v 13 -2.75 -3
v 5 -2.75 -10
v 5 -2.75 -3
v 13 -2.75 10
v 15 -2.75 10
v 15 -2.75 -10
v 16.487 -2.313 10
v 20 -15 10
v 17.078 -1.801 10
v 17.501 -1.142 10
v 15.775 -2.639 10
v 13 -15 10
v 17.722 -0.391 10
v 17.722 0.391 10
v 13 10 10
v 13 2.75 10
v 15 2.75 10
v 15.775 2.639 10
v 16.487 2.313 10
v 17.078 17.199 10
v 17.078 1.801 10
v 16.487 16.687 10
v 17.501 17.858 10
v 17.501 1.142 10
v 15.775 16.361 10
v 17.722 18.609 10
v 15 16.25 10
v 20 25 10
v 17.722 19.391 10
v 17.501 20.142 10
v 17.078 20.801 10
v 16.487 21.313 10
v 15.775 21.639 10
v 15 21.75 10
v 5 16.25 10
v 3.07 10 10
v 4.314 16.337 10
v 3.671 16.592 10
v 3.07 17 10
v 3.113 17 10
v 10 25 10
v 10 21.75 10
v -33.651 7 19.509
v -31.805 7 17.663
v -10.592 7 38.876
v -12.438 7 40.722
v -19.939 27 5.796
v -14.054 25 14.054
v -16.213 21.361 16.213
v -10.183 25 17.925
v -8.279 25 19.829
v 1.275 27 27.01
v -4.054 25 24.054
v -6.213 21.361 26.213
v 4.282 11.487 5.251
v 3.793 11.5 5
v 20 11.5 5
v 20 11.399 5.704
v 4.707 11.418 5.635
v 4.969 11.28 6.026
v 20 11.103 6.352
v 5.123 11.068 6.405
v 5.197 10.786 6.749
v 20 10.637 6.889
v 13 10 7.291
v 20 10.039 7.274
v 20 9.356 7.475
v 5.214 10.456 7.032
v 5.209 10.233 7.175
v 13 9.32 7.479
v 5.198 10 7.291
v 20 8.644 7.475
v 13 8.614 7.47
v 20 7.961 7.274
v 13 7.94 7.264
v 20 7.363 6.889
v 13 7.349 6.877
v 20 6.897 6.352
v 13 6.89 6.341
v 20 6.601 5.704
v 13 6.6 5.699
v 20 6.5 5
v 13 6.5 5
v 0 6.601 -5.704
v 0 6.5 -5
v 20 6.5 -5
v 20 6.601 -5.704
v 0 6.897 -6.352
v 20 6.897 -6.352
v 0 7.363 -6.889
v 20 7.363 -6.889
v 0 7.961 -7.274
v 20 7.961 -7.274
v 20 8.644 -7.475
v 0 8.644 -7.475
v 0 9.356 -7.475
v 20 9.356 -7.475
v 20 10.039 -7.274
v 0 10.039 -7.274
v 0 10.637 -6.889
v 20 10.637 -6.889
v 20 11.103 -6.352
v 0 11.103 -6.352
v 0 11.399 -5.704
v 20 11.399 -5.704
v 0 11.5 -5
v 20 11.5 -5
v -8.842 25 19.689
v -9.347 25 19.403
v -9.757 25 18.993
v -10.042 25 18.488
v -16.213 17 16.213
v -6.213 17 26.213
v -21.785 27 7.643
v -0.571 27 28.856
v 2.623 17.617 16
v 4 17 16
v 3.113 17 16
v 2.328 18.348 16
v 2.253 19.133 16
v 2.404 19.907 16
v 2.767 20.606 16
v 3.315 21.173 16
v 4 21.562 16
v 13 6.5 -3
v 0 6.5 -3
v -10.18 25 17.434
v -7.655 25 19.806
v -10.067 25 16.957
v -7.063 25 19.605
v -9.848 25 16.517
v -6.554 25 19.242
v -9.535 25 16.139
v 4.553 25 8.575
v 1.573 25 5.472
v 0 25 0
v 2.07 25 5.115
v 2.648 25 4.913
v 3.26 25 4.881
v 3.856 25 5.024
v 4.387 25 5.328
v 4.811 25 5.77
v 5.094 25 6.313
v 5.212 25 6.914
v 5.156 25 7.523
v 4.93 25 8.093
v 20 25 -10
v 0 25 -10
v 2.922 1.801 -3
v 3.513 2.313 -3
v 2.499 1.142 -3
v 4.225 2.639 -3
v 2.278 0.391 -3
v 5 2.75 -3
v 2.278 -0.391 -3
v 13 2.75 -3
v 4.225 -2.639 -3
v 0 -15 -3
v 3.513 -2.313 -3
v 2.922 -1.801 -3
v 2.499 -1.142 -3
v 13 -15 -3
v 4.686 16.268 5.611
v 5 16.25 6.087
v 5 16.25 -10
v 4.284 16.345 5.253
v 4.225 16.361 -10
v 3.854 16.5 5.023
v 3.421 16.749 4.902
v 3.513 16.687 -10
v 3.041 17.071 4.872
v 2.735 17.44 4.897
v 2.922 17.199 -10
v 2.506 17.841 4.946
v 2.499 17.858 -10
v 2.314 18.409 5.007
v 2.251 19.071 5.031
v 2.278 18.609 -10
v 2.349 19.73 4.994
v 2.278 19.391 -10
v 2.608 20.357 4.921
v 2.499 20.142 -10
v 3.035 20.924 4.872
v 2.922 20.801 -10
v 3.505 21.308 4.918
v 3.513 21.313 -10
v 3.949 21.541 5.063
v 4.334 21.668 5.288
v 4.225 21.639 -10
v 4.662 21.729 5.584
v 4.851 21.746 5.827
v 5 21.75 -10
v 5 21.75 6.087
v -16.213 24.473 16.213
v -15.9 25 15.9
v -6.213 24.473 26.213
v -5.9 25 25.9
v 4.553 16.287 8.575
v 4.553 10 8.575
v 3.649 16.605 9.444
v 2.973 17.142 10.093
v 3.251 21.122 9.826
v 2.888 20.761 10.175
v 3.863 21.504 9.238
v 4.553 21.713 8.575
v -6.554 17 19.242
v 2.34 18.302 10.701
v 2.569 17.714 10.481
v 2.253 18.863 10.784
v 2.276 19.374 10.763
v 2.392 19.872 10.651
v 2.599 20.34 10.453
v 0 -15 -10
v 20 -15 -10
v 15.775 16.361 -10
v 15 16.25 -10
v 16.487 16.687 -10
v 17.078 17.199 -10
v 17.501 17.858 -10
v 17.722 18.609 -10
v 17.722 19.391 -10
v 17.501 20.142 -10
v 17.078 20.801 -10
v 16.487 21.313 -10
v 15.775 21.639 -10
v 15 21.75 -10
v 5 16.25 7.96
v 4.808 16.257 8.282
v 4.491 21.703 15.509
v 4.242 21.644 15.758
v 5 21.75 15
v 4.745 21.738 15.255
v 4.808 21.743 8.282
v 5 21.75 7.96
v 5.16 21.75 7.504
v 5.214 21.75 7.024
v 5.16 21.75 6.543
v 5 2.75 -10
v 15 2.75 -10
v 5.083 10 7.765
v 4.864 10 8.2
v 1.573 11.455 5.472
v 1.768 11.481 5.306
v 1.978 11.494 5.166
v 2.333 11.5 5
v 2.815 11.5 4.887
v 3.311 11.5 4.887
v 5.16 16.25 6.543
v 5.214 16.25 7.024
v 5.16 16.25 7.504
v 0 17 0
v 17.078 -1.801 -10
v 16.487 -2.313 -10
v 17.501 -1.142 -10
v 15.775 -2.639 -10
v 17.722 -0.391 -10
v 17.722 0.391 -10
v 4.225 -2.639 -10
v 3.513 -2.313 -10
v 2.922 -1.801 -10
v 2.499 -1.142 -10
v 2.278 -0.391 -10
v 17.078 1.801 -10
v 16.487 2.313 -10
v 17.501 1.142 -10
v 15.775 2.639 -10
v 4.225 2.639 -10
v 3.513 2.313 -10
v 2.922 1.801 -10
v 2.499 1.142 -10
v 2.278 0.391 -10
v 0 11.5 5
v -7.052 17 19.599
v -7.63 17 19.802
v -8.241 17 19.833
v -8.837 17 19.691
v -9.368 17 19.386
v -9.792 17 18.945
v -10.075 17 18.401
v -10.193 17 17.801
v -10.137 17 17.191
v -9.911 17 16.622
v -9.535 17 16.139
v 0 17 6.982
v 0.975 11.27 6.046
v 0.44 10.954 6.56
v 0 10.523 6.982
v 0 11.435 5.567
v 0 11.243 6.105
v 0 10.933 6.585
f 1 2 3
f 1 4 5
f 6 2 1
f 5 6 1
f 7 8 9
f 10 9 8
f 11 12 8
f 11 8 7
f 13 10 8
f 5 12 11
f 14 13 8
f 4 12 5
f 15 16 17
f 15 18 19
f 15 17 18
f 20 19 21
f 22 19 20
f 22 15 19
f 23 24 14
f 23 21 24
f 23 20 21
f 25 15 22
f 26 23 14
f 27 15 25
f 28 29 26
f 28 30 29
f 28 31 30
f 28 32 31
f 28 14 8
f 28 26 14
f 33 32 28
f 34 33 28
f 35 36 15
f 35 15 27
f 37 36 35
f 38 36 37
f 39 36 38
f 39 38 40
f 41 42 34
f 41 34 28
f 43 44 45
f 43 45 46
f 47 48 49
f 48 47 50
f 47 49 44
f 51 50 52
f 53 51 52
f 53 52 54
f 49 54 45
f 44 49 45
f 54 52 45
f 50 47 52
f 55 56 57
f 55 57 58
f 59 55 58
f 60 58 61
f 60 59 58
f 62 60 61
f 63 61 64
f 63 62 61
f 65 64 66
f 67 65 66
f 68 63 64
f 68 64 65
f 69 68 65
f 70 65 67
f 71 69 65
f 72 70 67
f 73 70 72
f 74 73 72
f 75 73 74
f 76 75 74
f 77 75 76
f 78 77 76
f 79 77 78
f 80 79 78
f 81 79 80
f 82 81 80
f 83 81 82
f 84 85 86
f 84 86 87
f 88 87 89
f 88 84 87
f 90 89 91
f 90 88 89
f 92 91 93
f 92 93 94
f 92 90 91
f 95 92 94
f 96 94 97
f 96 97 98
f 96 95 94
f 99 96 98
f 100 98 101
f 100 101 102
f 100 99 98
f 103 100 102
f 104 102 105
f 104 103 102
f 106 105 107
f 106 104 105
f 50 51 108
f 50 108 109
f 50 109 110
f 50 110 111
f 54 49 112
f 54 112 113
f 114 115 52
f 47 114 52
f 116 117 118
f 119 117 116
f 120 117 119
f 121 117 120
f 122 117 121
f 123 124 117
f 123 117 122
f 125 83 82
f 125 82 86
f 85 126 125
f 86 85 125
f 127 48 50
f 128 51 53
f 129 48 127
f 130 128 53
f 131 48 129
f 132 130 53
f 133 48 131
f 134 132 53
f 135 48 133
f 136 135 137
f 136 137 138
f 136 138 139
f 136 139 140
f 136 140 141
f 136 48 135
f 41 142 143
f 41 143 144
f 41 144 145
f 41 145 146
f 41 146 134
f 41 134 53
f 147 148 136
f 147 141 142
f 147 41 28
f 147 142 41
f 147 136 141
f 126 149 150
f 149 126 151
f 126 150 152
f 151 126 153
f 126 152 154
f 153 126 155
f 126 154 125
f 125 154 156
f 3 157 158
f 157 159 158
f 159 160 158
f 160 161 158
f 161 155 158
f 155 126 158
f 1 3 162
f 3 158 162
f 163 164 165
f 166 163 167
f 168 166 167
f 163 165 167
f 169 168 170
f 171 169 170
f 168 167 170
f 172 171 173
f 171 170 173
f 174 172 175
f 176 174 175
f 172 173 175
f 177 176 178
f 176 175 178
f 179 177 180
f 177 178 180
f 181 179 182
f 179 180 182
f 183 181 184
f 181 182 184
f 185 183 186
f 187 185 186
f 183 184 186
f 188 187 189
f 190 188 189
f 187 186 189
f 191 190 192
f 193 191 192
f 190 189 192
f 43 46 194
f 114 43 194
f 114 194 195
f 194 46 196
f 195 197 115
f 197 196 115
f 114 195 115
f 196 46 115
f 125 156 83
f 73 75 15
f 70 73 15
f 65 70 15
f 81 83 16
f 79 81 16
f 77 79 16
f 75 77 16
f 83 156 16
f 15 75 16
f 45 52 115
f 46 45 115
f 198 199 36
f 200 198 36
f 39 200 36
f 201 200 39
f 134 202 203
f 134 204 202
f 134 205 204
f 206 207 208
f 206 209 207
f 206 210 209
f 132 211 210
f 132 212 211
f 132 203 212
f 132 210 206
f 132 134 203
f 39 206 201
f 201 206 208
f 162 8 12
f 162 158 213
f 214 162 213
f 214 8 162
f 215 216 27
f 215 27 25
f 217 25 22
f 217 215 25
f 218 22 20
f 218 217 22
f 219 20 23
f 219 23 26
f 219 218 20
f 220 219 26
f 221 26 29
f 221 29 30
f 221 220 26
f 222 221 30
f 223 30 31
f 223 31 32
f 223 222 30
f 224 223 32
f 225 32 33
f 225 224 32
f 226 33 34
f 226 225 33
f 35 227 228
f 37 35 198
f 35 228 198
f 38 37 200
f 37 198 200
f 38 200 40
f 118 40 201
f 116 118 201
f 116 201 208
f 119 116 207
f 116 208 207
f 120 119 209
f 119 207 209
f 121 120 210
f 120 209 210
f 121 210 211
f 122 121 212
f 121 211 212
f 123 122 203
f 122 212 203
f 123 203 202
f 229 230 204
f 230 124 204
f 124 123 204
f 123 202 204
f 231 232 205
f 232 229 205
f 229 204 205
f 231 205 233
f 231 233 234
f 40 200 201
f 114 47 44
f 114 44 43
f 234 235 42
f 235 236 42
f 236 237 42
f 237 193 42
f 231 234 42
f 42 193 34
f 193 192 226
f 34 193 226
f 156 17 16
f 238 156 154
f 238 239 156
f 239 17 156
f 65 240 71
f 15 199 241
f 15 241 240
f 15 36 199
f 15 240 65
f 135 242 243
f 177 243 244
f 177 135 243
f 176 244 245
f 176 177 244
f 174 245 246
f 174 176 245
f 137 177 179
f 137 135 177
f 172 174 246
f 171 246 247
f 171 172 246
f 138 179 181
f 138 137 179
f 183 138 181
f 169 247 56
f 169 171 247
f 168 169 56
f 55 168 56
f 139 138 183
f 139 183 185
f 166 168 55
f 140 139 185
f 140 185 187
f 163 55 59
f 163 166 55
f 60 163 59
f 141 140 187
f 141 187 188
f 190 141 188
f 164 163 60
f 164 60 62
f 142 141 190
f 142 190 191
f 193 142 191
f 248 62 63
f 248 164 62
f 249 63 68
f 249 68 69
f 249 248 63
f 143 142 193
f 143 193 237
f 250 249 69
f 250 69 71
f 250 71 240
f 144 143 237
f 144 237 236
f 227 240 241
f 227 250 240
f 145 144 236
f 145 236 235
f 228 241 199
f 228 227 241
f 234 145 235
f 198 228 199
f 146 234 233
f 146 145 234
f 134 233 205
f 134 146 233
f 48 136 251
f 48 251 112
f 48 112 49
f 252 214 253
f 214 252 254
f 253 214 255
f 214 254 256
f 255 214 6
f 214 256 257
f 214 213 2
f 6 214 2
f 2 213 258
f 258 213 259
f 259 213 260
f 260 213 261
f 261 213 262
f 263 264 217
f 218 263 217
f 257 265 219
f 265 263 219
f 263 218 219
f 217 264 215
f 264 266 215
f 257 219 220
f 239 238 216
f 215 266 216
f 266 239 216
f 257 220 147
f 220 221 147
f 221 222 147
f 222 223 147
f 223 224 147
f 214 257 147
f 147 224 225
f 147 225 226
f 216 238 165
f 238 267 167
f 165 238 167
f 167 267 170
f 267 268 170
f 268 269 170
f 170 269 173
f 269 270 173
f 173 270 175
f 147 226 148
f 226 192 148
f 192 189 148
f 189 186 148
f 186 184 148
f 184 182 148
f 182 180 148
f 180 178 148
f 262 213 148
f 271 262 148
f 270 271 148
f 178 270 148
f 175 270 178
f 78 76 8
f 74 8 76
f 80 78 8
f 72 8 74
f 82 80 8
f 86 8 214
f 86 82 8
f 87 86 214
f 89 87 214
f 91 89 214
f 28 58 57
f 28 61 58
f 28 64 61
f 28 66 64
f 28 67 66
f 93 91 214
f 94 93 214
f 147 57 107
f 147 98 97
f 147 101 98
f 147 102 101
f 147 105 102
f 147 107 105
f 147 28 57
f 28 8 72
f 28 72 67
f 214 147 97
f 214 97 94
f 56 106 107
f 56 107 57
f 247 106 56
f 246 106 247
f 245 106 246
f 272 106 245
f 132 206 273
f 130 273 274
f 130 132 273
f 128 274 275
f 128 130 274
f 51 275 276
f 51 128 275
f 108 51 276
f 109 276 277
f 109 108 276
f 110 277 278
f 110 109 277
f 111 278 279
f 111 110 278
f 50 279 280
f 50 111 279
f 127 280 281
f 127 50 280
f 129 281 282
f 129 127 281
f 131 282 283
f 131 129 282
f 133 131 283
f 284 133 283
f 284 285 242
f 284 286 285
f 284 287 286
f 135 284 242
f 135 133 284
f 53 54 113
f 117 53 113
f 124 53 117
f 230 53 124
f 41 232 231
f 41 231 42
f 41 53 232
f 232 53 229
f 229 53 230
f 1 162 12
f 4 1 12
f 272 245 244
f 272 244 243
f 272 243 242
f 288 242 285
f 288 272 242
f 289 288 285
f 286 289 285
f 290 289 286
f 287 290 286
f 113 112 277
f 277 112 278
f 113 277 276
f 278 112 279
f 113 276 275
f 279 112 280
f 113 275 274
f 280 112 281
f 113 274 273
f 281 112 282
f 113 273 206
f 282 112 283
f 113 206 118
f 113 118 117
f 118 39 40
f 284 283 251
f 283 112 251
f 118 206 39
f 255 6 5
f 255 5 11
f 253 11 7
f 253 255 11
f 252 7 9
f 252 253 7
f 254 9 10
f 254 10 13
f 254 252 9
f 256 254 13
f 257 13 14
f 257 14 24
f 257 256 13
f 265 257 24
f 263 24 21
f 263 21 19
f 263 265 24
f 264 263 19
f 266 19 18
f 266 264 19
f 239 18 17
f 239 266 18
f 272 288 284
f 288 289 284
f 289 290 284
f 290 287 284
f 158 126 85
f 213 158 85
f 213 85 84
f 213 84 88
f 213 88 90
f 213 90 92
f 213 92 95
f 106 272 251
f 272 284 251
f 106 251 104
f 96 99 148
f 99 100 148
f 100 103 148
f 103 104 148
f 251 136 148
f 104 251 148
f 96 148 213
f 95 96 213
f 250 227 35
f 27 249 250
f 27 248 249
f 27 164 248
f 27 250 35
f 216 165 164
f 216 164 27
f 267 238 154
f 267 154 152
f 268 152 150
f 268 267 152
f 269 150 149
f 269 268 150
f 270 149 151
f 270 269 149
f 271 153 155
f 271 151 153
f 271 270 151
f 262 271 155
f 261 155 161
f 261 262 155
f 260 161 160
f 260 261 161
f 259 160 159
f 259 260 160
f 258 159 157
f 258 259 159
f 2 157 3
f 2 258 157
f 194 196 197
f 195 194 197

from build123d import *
from build123d.topology import SkipClean

# Parameters (mm, degrees)
SKETCH_1_W           = 20
SKETCH_1_H           = 50
EXTRUDE_2_DEPTH      = 20
SKETCH_2_W           = 20
SKETCH_2_H           = 10
CUT_EXTRUDE_1_DEPTH  = 20
CUT_EXTRUDE_2_DEPTH  = 20
CUT_EXTRUDE_3_DEPTH  = 20
CUT_EXTRUDE_4_DEPTH  = 20
SKETCH_6_W           = 13
SKETCH_6_H           = 13
CUT_EXTRUDE_5_DEPTH  = 25
EXTRUDE_3_DEPTH      = 8
EXTRUDE_6_DEPTH      = 10
EXTRUDE_6_DEPTH_BACK = 20
CUT_EXTRUDE_7_DEPTH  = 18
CUT_EXTRUDE_8_DEPTH  = 26
CUT_EXTRUDE_9_DEPTH  = 26


with BuildPart() as part:
    # 草图1 → 凸台-拉伸2 (new body)
    with BuildSketch(Plane(origin=(0, 0, 0), x_dir=(0, 0, -1), z_dir=(1, 0, 0))):
        Rectangle(SKETCH_1_W, SKETCH_1_H)
    extrude(amount=EXTRUDE_2_DEPTH)

    # 草图2 → 切除-拉伸1 (cut)
    with BuildSketch(Plane(origin=(20, 0, 0), x_dir=(0, 0, -1), z_dir=(1, 0, 0))):
        with Locations((0, -20)):
            Rectangle(SKETCH_2_W, SKETCH_2_H)
    extrude(amount=-CUT_EXTRUDE_1_DEPTH, mode=Mode.SUBTRACT)

    # 草图3 → 切除-拉伸2 (cut)
    with BuildSketch(Plane(origin=(0, 0, -10), x_dir=(-1, 0, 0), z_dir=(0, 0, -1))):
        with BuildLine():
            Line((-15, 21.75), (-5, 21.75))
            ThreePointArc((-5, 21.75), (-2.25, 19), (-5, 16.25))
            Line((-5, 16.25), (-15, 16.25))
            ThreePointArc((-15, 16.25), (-17.75, 19), (-15, 21.75))
        make_face()
    extrude(amount=-CUT_EXTRUDE_2_DEPTH, mode=Mode.SUBTRACT)

    # 草图4 → 切除-拉伸3 (cut)
    with BuildSketch(Plane.ZY):
        with BuildLine():
            Line((-5, 11.5), (5, 11.5))
            ThreePointArc((5, 11.5), (7.5, 9), (5, 6.5))
            Line((5, 6.5), (-5, 6.5))
            ThreePointArc((-5, 6.5), (-7.5, 9), (-5, 11.5))
        make_face()
    extrude(amount=-CUT_EXTRUDE_3_DEPTH, mode=Mode.SUBTRACT)

    # 草图5 → 切除-拉伸4 (cut)
    with BuildSketch(Plane(origin=(0, 0, -10), x_dir=(-1, 0, 0), z_dir=(0, 0, -1))):
        with BuildLine():
            Line((-15, 2.75), (-5, 2.75))
            ThreePointArc((-5, 2.75), (-2.25, 0), (-5, -2.75))
            Line((-5, -2.75), (-15, -2.75))
            ThreePointArc((-15, -2.75), (-17.75, 0), (-15, 2.75))
        make_face()
    extrude(amount=-CUT_EXTRUDE_4_DEPTH, mode=Mode.SUBTRACT)

    # 草图6 → 切除-拉伸5 (cut)
    with BuildSketch(Plane.XZ.offset(15)):
        with Locations((6.5, 3.5)):
            Rectangle(SKETCH_6_W, SKETCH_6_H)
    extrude(amount=-CUT_EXTRUDE_5_DEPTH, mode=Mode.SUBTRACT)

    # 草图7 → 凸台-拉伸3 (add)
    with BuildSketch(Plane(origin=(0, 25, 0), x_dir=(1, 0, 0), z_dir=(0, 1, 0))):
        Polygon((-16.213203436, -16.213203436), (-6.213203436, -26.213203436), (10, -10), (0, 0), align=None)
    extrude(amount=-EXTRUDE_3_DEPTH)

    # 草图8 → 凸台-拉伸6 (add, two sides: drawn at the far end of the back side and taken through both)
    with BuildSketch(Plane(origin=(0, 0, 0), x_dir=(-0.707106781186539, 0, 0.707106781186556), z_dir=(-0.707106781186556, 0, -0.707106781186539)).offset(-EXTRUDE_6_DEPTH_BACK)):
        Polygon((18.197319143, 27), (34.979311766, 7), (37.590126345, 7), (20.808133721, 27), align=None)
    extrude(amount=EXTRUDE_6_DEPTH + EXTRUDE_6_DEPTH_BACK)

    # 草图11 → 切除-拉伸7 (cut)
    with BuildSketch(Plane(origin=(10, 0, 10), x_dir=(0.7071067811865497, 0, -0.7071067811865454), z_dir=(0.7071067811865454, 0, 0.7071067811865497))):
        Polygon((-22.928932188, 24.472530808), (-22.486332984, 25), (-22.928932188, 25), align=None)
    extrude(amount=-CUT_EXTRUDE_7_DEPTH, mode=Mode.SUBTRACT)

    # 草图12 → 切除-拉伸8 (cut)
    with SkipClean():  # the faces are left unmerged after this step: merging them gives an invalid solid
        with BuildSketch(Plane(origin=(0, 0, -10), x_dir=(-1, 0, 0), z_dir=(0, 0, -1))):
            with BuildLine():
                Line((-15, 16.25), (-5, 16.25))
                ThreePointArc((-5, 16.25), (-2.25, 19), (-5, 21.75))
                Line((-5, 21.75), (-15, 21.75))
                ThreePointArc((-15, 21.75), (-17.75, 19), (-15, 16.25))
            make_face()
        extrude(amount=-CUT_EXTRUDE_8_DEPTH, mode=Mode.SUBTRACT)
    add(part.part.scale(1), mode=Mode.REPLACE)  # the faces are merged on a copy

    # 草图13 → 切除-拉伸9 (cut)
    with BuildSketch(Plane(origin=(0, 25, 0), x_dir=(1, 0, 0), z_dir=(0, 1, 0))):
        with BuildLine():
            Line((-9.534541797, -16.138807841), (1.572830507, -5.47197893))
            ThreePointArc((1.572830507, -5.47197893), (4.614784317, -5.533524822), (4.553238425, -8.575478633))
            Line((4.553238425, -8.575478633), (-6.554133879, -19.242307544))
            ThreePointArc((-6.554133879, -19.242307544), (-9.596087689, -19.180761651), (-9.534541797, -16.138807841))
        make_face()
    extrude(amount=-CUT_EXTRUDE_9_DEPTH, mode=Mode.SUBTRACT)


solid = part.part
